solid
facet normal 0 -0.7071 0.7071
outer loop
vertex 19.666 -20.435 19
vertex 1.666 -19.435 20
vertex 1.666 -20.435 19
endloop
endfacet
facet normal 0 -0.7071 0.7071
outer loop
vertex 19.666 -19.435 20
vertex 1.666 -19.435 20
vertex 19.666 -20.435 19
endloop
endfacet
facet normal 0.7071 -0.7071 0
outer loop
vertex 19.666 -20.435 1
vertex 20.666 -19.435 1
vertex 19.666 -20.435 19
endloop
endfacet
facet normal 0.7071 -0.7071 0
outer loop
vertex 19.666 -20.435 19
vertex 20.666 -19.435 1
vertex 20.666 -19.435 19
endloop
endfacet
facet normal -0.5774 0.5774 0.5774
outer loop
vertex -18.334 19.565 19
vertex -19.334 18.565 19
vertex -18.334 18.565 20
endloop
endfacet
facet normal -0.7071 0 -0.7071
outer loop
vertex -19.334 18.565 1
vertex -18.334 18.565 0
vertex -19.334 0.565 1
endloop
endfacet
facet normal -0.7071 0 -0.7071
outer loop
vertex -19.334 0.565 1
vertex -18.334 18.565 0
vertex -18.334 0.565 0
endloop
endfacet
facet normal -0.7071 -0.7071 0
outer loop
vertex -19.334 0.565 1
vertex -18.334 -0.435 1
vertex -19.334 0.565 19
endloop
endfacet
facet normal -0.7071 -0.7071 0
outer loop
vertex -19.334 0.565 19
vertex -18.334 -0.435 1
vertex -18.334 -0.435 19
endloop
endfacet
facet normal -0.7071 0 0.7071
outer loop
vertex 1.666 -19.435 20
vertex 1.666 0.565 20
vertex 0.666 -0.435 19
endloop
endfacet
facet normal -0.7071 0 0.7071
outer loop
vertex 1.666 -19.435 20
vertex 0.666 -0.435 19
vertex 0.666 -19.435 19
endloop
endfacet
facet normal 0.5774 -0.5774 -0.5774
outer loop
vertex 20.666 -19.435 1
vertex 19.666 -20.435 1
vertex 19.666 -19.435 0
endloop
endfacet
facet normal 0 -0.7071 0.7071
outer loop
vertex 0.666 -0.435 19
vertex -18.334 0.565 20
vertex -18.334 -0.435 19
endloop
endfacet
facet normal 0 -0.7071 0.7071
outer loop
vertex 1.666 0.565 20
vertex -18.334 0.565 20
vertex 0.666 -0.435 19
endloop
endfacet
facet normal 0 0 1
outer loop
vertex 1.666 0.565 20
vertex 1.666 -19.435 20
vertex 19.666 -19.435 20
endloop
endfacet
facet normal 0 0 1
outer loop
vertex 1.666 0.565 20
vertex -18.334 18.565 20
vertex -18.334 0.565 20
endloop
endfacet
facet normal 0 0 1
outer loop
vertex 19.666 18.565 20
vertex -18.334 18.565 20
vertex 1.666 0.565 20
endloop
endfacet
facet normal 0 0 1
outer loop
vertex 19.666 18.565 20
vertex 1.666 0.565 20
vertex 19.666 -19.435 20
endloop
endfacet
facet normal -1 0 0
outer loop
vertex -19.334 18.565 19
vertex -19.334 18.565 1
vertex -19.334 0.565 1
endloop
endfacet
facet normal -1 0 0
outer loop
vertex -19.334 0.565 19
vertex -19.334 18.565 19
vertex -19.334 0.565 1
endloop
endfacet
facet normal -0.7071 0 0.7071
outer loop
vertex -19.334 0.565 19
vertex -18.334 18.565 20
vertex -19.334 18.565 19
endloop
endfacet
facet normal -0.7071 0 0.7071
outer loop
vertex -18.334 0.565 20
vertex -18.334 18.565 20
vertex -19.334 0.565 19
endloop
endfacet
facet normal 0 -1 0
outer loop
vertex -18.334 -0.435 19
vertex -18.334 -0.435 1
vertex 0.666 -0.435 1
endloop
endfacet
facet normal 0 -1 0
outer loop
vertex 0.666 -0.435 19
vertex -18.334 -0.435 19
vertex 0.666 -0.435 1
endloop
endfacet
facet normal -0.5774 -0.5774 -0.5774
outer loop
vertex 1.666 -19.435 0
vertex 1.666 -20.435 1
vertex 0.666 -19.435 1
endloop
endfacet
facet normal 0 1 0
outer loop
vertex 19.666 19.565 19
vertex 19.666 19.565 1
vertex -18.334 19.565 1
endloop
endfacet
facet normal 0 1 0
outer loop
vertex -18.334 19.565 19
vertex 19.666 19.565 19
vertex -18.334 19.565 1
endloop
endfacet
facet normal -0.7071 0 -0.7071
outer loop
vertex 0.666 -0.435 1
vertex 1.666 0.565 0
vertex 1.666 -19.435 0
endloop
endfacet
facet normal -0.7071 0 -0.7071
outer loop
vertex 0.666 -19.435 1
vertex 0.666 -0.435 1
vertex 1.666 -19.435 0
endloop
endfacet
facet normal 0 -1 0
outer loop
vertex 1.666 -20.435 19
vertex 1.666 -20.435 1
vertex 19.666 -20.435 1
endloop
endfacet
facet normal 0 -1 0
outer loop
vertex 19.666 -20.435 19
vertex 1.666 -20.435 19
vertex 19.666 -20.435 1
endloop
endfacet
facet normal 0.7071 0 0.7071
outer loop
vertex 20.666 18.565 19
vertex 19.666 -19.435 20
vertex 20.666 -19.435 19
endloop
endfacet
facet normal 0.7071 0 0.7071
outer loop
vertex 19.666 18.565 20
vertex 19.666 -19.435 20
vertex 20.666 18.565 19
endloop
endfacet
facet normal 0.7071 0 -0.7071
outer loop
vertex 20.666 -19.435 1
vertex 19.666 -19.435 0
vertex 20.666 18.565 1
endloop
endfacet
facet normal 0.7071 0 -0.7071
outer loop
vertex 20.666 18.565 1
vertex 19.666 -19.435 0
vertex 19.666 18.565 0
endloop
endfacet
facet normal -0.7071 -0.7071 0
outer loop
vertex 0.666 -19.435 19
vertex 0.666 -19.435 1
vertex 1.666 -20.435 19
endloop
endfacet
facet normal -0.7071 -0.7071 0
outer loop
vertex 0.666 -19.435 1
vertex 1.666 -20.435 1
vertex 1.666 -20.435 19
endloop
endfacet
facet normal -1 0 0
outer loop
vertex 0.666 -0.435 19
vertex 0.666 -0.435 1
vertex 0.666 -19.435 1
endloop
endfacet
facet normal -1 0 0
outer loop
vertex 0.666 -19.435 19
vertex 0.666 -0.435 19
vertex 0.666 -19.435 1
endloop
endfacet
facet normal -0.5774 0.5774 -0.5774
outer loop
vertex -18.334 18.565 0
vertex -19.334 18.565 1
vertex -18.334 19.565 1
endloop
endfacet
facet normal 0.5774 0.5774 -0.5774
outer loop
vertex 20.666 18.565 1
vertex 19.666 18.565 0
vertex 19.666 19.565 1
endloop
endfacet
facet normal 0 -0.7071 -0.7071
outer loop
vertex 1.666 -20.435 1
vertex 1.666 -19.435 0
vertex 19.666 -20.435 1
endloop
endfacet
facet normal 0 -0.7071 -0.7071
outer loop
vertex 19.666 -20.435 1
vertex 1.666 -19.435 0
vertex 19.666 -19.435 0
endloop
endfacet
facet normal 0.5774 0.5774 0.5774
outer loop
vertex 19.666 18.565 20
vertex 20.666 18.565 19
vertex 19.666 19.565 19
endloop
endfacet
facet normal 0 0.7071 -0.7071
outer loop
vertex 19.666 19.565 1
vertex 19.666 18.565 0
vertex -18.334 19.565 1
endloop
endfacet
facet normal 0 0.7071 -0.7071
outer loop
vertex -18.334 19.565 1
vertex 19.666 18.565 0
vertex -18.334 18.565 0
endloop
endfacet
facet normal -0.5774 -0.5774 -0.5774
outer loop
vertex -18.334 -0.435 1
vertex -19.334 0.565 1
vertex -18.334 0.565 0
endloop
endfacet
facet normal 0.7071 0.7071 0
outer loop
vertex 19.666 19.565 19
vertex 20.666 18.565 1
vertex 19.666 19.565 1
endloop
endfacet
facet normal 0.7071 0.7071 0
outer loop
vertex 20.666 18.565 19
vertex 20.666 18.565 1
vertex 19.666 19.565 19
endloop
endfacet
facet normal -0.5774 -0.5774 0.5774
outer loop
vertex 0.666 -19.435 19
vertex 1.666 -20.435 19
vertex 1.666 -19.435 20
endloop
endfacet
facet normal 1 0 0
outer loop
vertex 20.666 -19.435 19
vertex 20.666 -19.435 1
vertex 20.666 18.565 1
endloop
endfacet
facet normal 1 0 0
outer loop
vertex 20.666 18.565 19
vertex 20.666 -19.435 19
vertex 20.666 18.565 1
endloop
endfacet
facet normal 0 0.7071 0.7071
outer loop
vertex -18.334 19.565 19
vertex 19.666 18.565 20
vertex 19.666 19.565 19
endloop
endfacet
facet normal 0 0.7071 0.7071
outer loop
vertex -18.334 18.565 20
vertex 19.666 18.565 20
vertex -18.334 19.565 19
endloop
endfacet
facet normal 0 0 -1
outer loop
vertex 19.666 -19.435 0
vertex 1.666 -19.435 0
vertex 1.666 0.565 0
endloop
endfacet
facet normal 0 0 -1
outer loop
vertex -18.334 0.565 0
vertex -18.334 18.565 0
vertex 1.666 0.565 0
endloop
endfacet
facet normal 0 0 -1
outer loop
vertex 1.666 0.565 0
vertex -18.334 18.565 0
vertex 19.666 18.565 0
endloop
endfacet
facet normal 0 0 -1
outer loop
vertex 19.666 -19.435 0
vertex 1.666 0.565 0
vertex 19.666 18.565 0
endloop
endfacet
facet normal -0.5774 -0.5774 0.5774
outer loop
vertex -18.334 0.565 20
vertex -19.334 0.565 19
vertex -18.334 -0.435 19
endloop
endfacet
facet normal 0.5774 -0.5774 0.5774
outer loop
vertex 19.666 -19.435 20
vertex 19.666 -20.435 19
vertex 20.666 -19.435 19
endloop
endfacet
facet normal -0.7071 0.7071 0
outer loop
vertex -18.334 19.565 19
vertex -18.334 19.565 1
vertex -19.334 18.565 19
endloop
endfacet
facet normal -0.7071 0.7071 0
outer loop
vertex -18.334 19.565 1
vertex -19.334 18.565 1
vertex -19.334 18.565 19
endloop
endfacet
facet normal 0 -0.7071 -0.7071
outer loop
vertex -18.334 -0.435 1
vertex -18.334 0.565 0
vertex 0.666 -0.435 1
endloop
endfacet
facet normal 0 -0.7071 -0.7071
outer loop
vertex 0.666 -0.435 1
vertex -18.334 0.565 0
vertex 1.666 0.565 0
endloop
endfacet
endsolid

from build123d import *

# Parameters (mm, degrees)
F1_DEPTH = 20
F2_SIZE  = 1


with BuildPart() as f1:
    # F0 (on Top) → F1 (new body)
    with BuildSketch(Plane.XY):
        Polygon((20.665561, 19.565226), (-19.334439, 19.565226), (-19.334439, -0.434774), (0.665561, -0.434774), (0.665561, -20.434774), (20.665561, -20.434774), align=None)
    extrude(amount=F1_DEPTH)

    # F2
    f2_edges = [f1.edges().sort_by_distance(p)[0] for p in [
        (0.665561, -20.434774, 10),
        (20.665561, -20.434774, 10),
        (10.665561, -20.434774, 0),
        (10.665561, -20.434774, 20),
        (-19.334439, 19.565226, 10),
        (-19.334439, -0.434774, 10),
        (-19.334439, 9.565226, 0),
        (-19.334439, 9.565226, 20),
        (0.665561, 19.565226, 0),
        (-9.334439, -0.434774, 0),
        (0.665561, -10.434774, 0),
        (20.665561, -0.434774, 0),
        (20.665561, 19.565226, 10),
        (20.665561, -0.434774, 20),
        (0.665561, 19.565226, 20),
        (-9.334439, -0.434774, 20),
        (0.665561, -10.434774, 20),
    ]]
    chamfer(f2_edges, length=F2_SIZE)


solid = f1.part
